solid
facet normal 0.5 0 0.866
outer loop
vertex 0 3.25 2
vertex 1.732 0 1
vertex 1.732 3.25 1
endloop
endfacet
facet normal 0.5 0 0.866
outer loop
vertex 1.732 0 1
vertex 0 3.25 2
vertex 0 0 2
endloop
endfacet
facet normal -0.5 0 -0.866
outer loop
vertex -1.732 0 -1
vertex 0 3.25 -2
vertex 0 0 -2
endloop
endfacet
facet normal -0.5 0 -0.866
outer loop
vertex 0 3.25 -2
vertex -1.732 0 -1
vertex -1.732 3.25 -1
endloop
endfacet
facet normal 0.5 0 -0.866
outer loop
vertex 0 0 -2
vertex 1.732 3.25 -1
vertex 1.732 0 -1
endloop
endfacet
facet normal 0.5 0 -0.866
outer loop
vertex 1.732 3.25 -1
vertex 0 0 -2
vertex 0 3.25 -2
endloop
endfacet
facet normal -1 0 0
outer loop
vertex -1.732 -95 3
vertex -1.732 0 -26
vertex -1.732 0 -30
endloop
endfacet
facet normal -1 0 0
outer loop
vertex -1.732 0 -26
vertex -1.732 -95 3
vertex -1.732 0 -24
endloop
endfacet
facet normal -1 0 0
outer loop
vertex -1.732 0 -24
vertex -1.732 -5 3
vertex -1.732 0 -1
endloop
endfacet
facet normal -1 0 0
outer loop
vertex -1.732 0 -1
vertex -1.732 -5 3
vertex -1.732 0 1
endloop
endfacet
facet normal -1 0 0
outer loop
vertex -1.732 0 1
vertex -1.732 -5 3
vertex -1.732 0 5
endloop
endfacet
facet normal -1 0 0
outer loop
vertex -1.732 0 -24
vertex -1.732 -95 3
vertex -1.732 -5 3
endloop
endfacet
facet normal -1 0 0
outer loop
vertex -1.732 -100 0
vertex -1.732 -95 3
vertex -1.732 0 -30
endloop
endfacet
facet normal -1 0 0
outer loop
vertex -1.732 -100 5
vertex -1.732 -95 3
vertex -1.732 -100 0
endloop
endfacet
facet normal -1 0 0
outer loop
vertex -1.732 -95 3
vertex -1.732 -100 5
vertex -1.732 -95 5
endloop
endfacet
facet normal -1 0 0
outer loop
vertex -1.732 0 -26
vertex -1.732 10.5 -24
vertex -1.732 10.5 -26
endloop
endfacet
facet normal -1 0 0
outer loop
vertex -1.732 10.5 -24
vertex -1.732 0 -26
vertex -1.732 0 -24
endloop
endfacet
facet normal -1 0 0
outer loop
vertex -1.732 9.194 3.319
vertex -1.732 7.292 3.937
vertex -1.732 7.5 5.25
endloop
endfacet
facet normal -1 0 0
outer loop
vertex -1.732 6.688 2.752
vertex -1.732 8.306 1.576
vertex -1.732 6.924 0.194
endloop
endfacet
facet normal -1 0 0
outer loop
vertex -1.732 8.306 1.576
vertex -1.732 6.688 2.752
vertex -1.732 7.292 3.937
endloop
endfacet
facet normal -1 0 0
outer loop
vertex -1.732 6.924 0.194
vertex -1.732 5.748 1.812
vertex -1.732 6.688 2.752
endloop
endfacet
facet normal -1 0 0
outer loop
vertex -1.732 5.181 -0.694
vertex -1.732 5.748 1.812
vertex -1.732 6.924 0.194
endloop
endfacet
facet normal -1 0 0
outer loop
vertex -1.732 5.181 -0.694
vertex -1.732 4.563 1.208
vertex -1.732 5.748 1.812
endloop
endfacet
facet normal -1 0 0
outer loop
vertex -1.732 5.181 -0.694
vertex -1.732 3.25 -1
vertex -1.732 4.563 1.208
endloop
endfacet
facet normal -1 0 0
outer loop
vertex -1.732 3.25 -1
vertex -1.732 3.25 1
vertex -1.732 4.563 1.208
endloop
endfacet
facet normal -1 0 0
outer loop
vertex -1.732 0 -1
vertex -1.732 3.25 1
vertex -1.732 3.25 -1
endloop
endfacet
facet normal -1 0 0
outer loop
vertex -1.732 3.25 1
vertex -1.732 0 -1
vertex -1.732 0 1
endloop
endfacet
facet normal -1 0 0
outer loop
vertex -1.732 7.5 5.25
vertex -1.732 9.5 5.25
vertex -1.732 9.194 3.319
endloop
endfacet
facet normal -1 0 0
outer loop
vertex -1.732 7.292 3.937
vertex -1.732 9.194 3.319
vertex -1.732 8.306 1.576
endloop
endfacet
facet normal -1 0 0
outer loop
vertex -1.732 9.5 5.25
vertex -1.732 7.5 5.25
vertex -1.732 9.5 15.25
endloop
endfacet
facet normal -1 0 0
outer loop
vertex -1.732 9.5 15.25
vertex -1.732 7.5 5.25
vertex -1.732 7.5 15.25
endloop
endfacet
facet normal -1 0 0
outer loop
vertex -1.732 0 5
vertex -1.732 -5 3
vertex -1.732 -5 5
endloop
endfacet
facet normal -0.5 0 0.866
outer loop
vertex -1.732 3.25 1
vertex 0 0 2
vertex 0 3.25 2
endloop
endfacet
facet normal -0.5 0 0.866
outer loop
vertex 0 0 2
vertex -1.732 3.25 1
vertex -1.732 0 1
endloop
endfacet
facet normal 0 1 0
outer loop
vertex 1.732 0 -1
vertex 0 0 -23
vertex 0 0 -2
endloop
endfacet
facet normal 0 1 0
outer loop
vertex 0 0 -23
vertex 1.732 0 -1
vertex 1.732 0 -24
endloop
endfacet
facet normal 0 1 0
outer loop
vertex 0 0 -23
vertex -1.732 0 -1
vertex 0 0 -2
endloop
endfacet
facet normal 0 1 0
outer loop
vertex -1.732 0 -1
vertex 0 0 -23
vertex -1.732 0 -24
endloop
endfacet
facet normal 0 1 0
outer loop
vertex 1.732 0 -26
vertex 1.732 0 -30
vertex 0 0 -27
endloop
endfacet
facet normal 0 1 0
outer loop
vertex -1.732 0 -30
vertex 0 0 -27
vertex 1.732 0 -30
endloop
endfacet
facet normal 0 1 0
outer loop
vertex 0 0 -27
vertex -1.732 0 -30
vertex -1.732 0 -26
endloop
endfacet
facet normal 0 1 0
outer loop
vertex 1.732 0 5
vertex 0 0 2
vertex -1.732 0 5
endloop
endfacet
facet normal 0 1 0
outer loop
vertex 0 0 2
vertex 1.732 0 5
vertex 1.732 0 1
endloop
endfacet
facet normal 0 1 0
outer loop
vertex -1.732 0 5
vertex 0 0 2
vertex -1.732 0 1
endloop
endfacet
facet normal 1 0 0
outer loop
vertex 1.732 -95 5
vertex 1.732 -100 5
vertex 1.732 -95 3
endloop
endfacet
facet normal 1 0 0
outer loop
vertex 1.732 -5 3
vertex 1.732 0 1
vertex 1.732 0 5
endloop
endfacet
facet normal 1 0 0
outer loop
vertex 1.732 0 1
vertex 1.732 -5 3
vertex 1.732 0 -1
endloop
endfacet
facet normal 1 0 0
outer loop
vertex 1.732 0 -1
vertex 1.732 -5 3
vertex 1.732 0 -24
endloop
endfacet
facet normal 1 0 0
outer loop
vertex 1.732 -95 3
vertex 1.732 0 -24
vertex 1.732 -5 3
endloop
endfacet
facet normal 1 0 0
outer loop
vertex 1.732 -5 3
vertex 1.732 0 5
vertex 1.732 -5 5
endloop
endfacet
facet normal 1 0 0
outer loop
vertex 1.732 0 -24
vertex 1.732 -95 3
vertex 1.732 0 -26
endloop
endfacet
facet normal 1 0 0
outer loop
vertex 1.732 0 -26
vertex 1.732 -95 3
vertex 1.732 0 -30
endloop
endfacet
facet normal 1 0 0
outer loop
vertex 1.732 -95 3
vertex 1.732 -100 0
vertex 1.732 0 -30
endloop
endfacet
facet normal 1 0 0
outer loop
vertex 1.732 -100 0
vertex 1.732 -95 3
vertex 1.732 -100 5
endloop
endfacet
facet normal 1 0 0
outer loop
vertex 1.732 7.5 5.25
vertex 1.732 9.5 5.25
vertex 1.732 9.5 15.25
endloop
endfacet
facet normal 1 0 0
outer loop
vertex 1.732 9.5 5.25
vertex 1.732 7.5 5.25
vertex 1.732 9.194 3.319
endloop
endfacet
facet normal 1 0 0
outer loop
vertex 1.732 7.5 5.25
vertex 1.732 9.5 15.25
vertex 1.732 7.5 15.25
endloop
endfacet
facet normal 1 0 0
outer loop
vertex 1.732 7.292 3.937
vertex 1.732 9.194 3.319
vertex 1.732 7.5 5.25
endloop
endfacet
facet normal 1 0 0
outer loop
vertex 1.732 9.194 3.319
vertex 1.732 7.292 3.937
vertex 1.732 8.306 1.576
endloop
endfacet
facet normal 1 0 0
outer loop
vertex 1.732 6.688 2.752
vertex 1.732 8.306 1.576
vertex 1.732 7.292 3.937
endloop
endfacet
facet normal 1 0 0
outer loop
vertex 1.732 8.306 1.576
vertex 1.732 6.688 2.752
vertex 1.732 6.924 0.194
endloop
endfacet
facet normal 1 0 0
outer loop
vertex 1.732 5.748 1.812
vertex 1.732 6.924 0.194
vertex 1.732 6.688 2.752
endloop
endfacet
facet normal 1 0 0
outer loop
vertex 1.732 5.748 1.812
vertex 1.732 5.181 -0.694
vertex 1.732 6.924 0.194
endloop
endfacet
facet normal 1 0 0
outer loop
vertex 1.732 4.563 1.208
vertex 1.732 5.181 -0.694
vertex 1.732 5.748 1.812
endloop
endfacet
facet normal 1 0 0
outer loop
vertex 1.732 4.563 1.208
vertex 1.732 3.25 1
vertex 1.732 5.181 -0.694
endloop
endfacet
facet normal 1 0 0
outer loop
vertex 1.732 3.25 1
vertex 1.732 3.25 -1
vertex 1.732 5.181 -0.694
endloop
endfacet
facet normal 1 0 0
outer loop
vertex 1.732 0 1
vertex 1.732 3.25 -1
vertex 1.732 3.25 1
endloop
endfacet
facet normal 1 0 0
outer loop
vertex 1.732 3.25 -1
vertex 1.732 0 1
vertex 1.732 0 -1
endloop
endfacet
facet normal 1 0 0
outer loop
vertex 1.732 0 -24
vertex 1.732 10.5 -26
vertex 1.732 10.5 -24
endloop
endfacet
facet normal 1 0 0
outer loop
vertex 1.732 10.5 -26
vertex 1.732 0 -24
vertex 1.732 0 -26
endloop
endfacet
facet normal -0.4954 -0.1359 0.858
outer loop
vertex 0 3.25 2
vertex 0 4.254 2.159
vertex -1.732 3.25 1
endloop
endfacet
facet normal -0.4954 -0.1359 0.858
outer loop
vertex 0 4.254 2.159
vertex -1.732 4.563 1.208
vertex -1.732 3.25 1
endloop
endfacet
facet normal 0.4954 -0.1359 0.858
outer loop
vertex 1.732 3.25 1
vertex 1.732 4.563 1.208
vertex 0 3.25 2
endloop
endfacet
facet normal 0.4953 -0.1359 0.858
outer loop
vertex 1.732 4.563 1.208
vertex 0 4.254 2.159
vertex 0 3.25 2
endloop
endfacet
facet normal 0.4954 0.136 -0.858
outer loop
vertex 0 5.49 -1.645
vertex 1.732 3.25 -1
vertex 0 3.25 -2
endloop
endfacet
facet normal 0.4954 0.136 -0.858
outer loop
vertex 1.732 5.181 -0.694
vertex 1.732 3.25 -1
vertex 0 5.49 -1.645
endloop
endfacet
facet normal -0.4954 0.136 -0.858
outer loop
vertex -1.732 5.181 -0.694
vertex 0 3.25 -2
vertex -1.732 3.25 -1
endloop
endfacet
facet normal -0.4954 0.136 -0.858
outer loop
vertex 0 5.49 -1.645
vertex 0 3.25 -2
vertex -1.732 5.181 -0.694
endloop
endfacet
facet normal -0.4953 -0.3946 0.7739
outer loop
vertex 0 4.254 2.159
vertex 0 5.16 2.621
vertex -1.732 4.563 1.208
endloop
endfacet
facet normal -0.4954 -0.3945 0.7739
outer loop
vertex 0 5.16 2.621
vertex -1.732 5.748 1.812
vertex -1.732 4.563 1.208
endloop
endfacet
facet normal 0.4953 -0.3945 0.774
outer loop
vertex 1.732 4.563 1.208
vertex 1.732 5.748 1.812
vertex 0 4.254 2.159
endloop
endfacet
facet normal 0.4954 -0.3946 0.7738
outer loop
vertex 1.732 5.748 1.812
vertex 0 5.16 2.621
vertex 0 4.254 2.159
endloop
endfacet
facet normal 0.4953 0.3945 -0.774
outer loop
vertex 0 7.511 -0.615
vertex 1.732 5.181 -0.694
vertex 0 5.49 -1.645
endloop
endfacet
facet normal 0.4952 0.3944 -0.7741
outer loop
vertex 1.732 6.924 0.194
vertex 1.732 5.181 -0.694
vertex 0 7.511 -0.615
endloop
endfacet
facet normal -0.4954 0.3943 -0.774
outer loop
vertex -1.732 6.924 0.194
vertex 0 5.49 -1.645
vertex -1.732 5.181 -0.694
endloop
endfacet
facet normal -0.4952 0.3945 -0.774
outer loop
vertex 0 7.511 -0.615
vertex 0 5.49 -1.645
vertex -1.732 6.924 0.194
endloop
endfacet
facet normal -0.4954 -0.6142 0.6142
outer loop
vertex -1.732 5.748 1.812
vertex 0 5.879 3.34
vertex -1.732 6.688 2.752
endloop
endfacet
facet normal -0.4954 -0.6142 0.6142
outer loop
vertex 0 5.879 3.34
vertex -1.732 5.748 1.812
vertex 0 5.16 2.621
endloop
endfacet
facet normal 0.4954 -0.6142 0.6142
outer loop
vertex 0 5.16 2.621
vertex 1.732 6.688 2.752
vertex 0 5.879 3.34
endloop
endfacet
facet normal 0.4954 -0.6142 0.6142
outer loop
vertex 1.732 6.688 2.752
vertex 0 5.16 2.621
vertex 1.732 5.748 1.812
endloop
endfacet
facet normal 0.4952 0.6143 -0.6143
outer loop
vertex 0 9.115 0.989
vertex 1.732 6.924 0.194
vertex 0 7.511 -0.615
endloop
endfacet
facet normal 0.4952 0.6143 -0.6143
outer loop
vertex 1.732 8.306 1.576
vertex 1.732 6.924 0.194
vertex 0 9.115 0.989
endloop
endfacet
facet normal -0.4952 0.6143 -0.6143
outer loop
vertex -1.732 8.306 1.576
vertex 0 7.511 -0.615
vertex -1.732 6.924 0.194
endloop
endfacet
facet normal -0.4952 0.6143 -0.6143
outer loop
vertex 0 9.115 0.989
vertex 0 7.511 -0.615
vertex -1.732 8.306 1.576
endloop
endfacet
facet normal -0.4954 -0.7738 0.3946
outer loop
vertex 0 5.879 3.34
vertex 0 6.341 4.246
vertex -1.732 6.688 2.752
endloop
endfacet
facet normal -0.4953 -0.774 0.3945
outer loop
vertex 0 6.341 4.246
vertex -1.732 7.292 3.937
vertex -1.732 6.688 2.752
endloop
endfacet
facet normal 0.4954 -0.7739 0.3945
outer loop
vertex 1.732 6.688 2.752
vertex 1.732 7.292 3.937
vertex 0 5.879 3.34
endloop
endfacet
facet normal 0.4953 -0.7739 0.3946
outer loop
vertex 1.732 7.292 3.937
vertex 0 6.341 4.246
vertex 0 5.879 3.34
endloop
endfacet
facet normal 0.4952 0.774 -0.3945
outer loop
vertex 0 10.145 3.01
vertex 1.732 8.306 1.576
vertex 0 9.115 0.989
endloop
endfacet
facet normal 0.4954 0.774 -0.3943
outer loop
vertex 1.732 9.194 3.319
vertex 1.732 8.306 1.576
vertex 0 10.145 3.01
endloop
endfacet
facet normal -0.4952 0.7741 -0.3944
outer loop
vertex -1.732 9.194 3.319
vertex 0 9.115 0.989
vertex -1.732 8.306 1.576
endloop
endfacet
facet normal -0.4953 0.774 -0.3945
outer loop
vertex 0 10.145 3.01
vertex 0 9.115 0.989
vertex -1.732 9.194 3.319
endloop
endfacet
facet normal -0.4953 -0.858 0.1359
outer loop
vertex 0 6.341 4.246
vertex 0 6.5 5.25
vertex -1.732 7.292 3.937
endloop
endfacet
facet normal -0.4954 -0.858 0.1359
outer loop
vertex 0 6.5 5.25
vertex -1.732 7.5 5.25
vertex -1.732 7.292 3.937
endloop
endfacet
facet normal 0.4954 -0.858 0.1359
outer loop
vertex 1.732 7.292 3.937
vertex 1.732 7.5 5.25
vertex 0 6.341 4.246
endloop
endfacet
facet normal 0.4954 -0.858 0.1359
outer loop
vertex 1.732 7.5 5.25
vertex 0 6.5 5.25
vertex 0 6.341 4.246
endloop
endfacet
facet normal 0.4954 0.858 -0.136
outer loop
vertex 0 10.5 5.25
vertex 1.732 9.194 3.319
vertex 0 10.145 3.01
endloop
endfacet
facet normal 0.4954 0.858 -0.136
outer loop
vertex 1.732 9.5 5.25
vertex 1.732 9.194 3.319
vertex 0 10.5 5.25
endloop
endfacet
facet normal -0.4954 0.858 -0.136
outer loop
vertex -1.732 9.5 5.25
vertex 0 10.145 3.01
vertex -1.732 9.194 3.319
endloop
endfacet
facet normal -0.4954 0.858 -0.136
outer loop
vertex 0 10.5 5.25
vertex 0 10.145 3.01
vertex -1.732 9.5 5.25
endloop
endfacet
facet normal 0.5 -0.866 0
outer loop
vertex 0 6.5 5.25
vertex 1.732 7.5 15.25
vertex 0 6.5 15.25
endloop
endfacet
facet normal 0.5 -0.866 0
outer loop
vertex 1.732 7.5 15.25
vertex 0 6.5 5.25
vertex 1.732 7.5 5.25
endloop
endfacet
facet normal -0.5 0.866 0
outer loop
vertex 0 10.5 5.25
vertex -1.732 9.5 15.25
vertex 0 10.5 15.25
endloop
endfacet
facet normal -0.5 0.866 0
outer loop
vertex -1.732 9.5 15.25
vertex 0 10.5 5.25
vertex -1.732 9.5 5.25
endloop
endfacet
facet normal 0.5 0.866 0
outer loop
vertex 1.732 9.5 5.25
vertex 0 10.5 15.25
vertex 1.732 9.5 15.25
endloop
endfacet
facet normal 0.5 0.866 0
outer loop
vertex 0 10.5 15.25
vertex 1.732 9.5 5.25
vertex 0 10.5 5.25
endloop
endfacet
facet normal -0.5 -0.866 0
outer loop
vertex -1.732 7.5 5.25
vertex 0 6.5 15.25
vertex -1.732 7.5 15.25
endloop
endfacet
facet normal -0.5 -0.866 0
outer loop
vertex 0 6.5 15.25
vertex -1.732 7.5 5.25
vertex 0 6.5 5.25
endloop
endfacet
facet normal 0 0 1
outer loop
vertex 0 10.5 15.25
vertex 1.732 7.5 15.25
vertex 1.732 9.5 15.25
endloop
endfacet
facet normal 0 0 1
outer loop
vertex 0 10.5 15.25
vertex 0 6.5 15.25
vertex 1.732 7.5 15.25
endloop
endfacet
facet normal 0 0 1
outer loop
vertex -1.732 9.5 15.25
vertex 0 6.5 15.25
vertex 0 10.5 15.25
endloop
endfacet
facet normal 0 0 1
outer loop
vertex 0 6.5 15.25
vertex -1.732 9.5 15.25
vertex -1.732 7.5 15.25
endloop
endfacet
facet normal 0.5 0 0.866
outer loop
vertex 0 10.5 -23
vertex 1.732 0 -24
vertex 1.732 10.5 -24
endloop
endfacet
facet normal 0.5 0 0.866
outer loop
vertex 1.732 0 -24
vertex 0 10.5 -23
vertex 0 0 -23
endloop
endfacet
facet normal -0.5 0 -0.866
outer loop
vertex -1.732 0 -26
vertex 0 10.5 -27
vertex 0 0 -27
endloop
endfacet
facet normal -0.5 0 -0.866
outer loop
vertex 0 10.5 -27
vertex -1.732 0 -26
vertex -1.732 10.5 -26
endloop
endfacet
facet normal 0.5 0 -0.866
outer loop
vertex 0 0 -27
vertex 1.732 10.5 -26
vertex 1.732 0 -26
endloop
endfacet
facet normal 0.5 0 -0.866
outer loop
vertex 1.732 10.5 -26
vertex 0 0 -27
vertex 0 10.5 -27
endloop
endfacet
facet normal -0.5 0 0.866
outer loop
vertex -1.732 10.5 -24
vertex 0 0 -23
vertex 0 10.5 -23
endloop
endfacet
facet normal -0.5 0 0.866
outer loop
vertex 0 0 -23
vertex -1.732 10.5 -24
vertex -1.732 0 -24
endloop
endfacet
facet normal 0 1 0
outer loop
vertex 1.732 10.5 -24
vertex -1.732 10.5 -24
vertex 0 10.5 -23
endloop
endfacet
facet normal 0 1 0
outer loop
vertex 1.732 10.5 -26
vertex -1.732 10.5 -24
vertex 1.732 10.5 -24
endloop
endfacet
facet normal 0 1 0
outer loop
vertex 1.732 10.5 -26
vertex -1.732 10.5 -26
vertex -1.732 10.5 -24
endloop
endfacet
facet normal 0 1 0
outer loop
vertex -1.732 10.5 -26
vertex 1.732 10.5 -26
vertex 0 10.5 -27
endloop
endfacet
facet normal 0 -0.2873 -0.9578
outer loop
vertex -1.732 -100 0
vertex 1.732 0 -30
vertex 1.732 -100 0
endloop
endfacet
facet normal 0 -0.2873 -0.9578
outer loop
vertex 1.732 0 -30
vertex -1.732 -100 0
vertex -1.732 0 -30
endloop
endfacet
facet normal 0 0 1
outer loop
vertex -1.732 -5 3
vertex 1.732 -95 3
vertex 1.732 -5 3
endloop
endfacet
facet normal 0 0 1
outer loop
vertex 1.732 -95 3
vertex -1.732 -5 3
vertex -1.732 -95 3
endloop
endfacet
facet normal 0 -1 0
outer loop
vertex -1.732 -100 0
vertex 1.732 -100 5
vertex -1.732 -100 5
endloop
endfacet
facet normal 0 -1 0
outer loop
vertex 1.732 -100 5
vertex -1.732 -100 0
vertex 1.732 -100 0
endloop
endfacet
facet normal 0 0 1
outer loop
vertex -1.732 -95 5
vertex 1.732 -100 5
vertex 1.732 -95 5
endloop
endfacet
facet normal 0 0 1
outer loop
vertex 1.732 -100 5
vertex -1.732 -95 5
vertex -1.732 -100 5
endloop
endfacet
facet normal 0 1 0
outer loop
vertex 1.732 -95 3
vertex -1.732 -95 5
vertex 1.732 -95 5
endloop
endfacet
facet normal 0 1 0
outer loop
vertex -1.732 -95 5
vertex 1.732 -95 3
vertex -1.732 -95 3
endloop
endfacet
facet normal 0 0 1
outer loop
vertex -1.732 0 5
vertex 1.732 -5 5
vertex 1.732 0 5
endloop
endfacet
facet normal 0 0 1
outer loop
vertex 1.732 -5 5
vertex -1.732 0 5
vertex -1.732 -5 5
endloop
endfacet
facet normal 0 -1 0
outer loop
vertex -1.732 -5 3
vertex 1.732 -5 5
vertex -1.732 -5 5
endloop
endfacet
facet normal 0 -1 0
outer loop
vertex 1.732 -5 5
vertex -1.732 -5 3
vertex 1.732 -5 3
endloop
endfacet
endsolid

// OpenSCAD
I = 25;
R = 2;
W = R * sqrt(3) / 2;
thick = 6.5;

rotate([-90, 30, 0])
    cylinder(r = R, h = thick / 2, $fn = 6);
translate([0, thick / 2, thick / 2 + R])
    rotate([0, 90, 0])
        rotate_extrude(angle = 90)
            translate([thick / 2 + R, 0])
                circle(r = R, $fn = 6);
translate([0, thick + R, thick / 2 + R])
    rotate([0, 0, 30])
        cylinder(r = R, h = 10, $fn = 6);

translate([0, 0, -I])
    rotate([-90, 30, 0])
        cylinder(r = R, h = thick + R * 2, $fn = 6);

translate([-W, 0, 0])
    rotate([0, 90, 0])
        linear_extrude(W * 2)
            polygon([[I + 5, 0], [-3, 0], [-3, -100], [0, -100]]);
translate([-W, -100, 0])
    cube([W * 2, 5, 5]);
translate([-W, -5, 0])
    cube([W * 2, 5, 5]);

/*
I = 25;
thick = 2;
W = I * 6 + 5 * 2;
D = 100;

difference() {
    hull() {
        for (x = [thick, W - thick])
            for (y = [thick, D - thick])
                translate([x, y, thick])
                    sphere(r = thick, $fn = 16);
    }
    translate([thick, thick, thick / 2])
        cube([W - thick * 2, D - thick * 2, thick * 2]);
    for (i = [0:6])
        for (y = [0, D - 5.5])
            translate([i * I + 5 - 1.9, y, 0])
                cube([3.8, 5.5, 2.5]);
}
*/
